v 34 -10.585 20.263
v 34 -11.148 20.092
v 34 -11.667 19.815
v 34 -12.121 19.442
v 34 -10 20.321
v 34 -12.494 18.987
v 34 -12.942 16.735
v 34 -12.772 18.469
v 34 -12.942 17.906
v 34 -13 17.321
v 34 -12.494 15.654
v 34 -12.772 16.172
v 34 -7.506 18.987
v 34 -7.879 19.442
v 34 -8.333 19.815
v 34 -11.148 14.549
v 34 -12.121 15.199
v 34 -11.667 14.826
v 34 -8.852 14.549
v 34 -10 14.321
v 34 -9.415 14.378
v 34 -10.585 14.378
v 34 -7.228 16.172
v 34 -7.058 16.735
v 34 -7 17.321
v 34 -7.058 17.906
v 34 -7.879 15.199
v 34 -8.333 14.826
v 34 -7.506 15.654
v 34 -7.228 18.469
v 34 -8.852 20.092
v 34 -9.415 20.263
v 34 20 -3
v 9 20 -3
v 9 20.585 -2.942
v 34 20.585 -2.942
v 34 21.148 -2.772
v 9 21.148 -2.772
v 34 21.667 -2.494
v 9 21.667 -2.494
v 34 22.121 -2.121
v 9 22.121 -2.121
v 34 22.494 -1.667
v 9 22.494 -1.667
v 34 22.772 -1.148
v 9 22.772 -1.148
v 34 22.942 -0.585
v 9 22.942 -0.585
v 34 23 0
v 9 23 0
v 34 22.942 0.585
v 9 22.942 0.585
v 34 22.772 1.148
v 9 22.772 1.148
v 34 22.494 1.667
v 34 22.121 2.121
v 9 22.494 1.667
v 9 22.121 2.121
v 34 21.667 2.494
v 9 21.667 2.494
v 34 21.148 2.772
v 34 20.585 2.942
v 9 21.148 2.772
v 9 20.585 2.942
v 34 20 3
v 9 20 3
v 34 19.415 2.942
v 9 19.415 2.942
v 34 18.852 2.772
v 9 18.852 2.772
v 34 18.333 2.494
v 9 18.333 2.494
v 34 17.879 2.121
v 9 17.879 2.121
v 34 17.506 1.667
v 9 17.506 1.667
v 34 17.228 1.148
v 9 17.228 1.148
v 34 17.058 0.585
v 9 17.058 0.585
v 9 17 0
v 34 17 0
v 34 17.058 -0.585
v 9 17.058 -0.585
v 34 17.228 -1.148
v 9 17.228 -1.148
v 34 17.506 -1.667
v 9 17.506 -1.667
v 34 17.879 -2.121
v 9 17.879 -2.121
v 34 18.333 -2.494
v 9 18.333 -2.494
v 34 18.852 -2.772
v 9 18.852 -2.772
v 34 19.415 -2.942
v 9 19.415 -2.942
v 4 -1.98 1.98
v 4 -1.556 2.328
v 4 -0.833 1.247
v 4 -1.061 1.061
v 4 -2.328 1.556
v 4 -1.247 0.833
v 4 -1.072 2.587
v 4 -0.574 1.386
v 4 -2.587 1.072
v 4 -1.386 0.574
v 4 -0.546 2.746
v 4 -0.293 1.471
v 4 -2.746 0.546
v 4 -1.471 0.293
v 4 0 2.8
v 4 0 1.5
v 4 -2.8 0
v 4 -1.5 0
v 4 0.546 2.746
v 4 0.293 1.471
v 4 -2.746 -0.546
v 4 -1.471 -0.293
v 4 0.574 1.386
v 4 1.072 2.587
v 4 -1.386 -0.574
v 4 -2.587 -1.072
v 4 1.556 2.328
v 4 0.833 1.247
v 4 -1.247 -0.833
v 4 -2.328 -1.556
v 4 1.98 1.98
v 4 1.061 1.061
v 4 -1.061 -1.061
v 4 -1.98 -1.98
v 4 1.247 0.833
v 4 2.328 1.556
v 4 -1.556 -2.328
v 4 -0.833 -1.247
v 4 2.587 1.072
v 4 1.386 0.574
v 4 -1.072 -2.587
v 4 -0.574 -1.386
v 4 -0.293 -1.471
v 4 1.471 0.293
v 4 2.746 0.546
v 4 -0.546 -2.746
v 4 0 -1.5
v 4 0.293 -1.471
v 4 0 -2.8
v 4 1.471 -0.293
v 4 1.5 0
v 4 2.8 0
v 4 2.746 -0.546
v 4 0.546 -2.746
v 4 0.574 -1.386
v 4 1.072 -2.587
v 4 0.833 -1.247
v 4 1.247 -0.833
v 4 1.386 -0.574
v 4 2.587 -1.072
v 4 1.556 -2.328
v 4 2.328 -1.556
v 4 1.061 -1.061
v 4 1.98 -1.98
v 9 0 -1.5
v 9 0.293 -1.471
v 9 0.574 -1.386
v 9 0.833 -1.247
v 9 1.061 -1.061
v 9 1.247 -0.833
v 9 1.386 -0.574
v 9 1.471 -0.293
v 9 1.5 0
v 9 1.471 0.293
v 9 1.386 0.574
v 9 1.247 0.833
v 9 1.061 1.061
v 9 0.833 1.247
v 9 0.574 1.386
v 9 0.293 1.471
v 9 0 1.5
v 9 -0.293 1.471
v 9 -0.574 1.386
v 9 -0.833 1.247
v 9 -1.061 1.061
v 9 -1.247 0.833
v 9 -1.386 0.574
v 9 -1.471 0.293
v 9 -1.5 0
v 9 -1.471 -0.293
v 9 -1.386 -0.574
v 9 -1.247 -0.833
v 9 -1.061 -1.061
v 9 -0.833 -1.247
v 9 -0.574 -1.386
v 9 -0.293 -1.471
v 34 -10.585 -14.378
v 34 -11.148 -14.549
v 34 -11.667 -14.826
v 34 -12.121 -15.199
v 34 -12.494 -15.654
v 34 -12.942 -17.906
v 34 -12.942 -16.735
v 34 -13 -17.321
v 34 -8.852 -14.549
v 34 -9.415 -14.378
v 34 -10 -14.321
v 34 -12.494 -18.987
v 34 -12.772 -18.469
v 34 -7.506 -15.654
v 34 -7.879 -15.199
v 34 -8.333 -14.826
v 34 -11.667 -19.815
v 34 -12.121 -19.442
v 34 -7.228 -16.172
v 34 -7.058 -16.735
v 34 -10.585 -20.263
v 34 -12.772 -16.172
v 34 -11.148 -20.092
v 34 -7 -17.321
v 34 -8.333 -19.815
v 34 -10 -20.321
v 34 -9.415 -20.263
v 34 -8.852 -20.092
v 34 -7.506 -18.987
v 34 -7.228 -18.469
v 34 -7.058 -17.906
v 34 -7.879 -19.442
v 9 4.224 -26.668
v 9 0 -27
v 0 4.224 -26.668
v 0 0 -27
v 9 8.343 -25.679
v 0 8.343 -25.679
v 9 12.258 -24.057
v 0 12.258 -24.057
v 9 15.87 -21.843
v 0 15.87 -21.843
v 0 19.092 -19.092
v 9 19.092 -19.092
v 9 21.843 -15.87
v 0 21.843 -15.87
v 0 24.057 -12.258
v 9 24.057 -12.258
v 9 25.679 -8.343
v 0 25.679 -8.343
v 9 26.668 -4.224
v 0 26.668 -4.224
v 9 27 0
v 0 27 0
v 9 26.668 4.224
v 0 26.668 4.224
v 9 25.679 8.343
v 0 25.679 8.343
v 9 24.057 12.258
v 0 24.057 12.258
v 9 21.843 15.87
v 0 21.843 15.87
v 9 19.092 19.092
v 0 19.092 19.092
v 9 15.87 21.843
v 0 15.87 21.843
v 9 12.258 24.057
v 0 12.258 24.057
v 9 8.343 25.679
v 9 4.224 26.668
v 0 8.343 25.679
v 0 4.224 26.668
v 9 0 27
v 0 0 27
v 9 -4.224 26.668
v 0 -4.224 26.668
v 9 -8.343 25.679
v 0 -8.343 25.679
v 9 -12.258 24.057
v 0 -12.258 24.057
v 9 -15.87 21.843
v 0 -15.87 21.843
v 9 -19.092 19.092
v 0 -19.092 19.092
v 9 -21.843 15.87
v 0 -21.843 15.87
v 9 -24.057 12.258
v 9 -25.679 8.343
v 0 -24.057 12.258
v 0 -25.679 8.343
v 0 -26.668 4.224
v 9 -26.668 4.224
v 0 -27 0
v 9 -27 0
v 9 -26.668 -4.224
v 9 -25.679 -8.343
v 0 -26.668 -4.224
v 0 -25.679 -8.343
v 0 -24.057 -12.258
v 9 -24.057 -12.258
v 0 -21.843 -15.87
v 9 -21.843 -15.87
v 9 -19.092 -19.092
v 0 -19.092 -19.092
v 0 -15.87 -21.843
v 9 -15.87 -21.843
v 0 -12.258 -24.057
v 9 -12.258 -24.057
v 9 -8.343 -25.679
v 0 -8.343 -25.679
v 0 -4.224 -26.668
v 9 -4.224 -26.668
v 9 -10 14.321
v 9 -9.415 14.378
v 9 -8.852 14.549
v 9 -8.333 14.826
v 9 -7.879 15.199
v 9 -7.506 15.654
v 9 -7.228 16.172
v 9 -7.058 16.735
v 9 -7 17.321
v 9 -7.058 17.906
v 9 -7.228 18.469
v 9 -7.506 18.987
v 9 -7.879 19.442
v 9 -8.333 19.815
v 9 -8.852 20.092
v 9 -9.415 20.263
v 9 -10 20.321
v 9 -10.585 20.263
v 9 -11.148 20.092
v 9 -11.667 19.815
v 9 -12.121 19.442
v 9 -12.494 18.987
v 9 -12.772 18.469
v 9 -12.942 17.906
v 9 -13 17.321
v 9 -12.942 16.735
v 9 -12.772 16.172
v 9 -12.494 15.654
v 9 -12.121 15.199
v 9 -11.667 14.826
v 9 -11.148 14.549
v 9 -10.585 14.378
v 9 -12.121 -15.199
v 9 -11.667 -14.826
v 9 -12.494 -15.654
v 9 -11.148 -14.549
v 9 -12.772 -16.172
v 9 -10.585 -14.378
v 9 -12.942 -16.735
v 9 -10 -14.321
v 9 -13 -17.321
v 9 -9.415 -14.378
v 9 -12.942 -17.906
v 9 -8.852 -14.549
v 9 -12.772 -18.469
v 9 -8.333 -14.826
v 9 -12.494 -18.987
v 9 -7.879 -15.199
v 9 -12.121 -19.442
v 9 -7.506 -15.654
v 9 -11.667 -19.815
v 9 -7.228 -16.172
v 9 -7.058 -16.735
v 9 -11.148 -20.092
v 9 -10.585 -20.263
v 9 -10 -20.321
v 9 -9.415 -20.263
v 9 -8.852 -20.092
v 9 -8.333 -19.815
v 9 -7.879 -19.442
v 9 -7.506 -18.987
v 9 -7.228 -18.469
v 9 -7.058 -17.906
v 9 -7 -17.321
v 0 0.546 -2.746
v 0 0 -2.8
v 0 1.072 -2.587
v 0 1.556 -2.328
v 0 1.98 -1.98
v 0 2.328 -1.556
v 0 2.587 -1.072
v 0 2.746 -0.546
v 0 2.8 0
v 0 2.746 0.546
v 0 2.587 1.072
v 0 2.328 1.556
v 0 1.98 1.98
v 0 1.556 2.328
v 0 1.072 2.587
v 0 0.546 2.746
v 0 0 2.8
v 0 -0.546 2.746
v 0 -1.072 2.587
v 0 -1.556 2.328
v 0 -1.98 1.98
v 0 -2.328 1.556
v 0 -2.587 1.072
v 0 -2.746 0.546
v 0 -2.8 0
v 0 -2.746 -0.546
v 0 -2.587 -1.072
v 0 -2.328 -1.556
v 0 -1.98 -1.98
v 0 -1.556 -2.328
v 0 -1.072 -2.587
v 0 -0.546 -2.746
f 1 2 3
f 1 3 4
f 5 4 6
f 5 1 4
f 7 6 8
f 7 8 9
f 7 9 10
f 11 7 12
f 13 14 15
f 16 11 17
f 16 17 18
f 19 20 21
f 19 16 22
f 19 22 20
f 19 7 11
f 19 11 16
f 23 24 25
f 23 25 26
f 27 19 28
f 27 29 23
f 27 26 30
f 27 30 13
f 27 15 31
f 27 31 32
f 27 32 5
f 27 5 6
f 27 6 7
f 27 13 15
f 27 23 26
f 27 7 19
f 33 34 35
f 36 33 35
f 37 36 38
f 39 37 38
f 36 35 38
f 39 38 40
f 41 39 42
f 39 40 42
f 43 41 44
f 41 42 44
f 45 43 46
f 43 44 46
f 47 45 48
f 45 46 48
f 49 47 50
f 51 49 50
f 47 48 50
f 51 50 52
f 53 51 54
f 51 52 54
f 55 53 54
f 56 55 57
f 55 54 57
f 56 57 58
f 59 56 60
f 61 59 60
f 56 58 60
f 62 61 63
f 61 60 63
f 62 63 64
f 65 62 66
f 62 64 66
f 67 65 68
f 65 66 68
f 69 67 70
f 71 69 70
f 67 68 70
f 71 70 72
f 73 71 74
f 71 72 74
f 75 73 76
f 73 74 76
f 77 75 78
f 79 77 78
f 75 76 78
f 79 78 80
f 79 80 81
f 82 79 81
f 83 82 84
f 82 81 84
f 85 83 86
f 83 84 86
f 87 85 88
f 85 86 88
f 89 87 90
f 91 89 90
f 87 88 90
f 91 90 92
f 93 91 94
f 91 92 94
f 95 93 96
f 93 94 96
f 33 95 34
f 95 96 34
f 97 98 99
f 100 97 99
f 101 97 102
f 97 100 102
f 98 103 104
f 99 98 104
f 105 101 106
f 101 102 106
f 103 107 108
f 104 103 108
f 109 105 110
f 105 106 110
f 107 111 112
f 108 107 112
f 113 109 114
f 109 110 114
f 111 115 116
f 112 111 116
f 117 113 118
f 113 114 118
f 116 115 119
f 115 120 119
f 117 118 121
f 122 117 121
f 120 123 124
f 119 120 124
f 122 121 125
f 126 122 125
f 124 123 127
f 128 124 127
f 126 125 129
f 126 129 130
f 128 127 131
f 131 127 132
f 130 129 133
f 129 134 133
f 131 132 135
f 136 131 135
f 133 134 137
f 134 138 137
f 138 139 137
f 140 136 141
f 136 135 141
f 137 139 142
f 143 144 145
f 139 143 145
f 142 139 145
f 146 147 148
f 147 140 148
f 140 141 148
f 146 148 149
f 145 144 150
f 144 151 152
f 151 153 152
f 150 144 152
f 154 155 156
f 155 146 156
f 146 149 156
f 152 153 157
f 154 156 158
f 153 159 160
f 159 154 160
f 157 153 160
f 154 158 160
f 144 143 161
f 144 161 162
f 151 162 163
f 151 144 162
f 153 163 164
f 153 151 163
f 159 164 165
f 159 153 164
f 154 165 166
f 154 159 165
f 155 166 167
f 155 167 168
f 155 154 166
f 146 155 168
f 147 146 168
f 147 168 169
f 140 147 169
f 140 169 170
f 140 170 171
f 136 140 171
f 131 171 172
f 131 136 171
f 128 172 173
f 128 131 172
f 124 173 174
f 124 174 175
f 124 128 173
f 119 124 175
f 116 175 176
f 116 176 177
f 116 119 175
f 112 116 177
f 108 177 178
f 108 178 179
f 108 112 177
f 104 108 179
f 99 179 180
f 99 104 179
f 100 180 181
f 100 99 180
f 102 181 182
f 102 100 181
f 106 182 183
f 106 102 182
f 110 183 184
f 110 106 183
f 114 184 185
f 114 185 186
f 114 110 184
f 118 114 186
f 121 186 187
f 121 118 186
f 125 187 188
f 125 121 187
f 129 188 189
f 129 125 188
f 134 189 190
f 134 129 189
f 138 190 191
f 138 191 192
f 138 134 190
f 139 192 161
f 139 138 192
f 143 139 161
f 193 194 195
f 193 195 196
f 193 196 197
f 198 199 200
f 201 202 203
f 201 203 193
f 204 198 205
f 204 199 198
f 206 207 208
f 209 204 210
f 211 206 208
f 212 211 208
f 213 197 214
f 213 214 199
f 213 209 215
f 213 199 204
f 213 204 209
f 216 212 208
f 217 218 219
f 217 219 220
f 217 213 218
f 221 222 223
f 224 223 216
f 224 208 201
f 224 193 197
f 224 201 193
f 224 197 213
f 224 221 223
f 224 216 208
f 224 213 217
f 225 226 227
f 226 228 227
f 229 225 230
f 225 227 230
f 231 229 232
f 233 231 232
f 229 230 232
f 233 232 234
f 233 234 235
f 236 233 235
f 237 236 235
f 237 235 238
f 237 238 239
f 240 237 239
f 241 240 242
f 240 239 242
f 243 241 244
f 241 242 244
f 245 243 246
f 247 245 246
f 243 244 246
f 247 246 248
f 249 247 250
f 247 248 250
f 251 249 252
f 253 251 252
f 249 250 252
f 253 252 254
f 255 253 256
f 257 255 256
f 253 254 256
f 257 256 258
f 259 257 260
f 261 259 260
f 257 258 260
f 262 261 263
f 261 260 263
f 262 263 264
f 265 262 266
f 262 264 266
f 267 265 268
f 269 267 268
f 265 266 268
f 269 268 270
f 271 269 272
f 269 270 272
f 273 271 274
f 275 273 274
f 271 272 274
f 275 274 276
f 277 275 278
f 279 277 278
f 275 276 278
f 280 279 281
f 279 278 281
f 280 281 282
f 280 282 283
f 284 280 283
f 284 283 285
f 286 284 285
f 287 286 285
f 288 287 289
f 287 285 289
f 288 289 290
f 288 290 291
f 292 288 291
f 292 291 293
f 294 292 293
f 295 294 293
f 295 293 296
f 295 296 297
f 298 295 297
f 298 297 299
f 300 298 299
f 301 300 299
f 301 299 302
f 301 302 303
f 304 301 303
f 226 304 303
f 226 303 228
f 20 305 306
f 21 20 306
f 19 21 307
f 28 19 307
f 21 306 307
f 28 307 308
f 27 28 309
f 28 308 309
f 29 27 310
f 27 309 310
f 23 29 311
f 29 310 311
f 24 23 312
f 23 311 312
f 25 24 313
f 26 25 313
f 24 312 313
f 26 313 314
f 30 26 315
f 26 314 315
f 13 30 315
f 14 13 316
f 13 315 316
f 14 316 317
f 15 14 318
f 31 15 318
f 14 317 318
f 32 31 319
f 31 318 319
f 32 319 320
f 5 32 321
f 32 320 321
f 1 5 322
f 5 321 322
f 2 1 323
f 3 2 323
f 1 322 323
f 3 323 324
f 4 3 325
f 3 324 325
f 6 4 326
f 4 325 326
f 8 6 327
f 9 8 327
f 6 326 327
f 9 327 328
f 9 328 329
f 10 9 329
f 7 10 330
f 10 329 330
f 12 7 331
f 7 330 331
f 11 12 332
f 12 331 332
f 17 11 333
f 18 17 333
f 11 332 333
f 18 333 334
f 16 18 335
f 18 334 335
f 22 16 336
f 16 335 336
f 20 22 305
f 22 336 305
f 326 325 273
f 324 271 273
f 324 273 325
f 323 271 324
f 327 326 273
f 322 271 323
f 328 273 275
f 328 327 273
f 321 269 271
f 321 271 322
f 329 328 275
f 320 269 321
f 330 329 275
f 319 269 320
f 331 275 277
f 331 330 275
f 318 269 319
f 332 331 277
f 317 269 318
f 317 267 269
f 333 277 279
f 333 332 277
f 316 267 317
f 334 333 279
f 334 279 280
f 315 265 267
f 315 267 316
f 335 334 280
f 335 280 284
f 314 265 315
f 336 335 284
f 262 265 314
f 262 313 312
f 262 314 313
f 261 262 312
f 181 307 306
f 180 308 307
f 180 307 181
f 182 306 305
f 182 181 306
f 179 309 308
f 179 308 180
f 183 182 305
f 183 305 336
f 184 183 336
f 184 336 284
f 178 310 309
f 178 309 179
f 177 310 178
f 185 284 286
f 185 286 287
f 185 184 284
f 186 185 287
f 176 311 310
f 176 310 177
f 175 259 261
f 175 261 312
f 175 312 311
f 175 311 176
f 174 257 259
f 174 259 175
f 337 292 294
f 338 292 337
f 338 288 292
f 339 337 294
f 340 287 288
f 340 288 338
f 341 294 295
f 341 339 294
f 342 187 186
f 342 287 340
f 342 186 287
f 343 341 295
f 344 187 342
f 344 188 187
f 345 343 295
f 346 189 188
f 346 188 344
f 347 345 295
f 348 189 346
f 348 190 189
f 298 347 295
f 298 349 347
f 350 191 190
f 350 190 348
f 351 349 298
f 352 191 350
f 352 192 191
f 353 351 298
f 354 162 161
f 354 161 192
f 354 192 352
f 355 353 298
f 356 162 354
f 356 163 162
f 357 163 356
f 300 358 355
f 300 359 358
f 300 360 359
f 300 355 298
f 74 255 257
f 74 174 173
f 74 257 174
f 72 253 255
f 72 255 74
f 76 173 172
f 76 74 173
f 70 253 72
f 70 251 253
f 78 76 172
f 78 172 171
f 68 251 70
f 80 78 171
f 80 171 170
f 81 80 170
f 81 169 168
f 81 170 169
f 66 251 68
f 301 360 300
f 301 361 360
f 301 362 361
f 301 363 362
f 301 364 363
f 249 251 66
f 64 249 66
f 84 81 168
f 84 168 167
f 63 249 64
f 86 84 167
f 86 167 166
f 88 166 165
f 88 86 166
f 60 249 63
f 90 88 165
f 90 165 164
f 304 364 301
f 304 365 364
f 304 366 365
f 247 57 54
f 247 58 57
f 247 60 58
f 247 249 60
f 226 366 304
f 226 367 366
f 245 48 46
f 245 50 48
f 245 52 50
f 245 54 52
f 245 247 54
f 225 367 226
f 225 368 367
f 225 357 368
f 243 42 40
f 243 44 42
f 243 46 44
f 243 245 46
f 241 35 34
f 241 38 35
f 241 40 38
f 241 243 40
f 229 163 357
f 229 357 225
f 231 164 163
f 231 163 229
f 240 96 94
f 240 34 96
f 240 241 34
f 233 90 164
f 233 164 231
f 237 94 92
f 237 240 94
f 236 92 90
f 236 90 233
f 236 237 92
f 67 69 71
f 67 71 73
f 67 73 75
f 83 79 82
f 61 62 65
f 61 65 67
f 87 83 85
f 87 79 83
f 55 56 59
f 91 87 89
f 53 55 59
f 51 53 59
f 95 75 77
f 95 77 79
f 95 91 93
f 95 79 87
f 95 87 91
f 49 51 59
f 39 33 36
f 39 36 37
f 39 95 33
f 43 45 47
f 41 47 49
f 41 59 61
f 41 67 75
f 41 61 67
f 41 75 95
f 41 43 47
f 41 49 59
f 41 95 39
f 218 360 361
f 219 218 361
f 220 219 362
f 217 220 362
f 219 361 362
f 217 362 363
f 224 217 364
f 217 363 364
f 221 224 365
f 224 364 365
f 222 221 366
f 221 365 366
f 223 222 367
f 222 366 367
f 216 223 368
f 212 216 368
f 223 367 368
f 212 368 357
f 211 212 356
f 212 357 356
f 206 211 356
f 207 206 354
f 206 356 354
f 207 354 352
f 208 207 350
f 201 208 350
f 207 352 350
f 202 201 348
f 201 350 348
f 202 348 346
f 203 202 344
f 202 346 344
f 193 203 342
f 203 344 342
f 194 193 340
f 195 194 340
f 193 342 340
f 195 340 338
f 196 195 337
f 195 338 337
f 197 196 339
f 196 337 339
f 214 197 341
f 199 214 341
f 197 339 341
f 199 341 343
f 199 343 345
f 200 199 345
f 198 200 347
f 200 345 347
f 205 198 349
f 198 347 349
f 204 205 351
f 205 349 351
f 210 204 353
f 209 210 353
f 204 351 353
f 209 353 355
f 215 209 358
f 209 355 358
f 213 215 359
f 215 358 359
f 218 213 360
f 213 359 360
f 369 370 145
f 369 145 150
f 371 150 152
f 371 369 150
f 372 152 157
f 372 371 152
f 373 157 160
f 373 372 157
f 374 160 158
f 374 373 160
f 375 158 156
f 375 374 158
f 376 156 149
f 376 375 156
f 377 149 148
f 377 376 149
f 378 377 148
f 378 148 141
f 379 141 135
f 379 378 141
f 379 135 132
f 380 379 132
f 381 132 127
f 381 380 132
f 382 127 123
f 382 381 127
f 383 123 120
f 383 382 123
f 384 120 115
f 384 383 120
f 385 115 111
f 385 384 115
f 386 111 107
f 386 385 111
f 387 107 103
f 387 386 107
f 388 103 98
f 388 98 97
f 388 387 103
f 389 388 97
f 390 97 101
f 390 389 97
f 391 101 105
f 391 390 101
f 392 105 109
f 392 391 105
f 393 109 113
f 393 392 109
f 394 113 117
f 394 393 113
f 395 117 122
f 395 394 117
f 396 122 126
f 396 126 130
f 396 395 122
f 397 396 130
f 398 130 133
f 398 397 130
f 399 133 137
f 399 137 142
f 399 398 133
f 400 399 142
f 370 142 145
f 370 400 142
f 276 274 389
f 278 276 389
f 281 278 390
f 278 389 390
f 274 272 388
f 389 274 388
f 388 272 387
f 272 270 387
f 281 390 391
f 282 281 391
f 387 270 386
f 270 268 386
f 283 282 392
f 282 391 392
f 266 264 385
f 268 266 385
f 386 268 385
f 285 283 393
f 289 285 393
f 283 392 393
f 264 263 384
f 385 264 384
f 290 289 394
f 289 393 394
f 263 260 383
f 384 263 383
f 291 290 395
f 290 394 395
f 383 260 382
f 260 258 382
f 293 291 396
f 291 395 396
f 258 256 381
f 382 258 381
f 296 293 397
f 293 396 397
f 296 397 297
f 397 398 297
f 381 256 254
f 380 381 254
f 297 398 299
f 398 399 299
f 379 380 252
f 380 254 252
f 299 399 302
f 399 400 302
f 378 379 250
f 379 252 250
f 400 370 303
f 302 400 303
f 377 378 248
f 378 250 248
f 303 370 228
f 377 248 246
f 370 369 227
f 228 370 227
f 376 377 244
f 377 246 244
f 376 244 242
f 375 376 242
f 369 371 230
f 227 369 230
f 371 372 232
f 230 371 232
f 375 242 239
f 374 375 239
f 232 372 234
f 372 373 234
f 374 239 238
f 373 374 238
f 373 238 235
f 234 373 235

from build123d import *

# Parameters (mm, degrees)
SKETCH1_R           = 27
SKETCH1_R_2         = 2.8
BOSS_EXTRUDE2_DEPTH = 4
SKETCH2_R           = 27
SKETCH2_R_2         = 2.8
SKETCH2_R_3         = 1.5
BOSS_EXTRUDE3_DEPTH = 5
SKETCH3_R           = 3
BOSS_EXTRUDE4_DEPTH = 25
SKETCH4_R           = 12.2
SKETCH4_R_2         = 7.64
BOSS_EXTRUDE5_DEPTH = 3
SKETCH5_R           = 12.2
SKETCH5_R_2         = 7.64
CUT_EXTRUDE1_DEPTH  = 3


with BuildPart() as part:
    # Sketch1 → Boss-Extrude2 (new body)
    with BuildSketch(Plane(origin=(0, 0, 0), x_dir=(0, 0, -1), z_dir=(1, 0, 0))):
        Circle(SKETCH1_R)
        Circle(SKETCH1_R_2, mode=Mode.SUBTRACT)
    extrude(amount=BOSS_EXTRUDE2_DEPTH)

    # Sketch2 → Boss-Extrude3 (add)
    with BuildSketch(Plane(origin=(4, 0, 0), x_dir=(0, 0, -1), z_dir=(1, 0, 0))):
        Circle(SKETCH2_R)
        Circle(SKETCH2_R_2, mode=Mode.SUBTRACT)
        Circle(SKETCH2_R_2)
        Circle(SKETCH2_R_3, mode=Mode.SUBTRACT)
    extrude(amount=BOSS_EXTRUDE3_DEPTH)

    # Sketch3 → Boss-Extrude4 (add)
    with BuildSketch(Plane(origin=(9, 0, 0), x_dir=(0, 0, -1), z_dir=(1, 0, 0))):
        with Locations((0, 20)):
            Circle(SKETCH3_R)
        with Locations((17.320508076, -10)):
            Circle(SKETCH3_R)
        with Locations((-17.320508076, -10)):
            Circle(SKETCH3_R)
    extrude(amount=BOSS_EXTRUDE4_DEPTH)

    # Sketch4 → Boss-Extrude5 (add)
    with BuildSketch(Plane(origin=(9, 0, 0), x_dir=(0, 0, -1), z_dir=(1, 0, 0))):
        Circle(SKETCH4_R)
        Circle(SKETCH4_R_2, mode=Mode.SUBTRACT)
    extrude(amount=BOSS_EXTRUDE5_DEPTH)

    # Sketch5 → Cut-Extrude1 (cut)
    with BuildSketch(Plane(origin=(12, 0, 0), x_dir=(0, 0, -1), z_dir=(1, 0, 0))):
        Circle(SKETCH5_R)
        Circle(SKETCH5_R_2, mode=Mode.SUBTRACT)
    extrude(amount=-CUT_EXTRUDE1_DEPTH, mode=Mode.SUBTRACT)


solid = part.part
